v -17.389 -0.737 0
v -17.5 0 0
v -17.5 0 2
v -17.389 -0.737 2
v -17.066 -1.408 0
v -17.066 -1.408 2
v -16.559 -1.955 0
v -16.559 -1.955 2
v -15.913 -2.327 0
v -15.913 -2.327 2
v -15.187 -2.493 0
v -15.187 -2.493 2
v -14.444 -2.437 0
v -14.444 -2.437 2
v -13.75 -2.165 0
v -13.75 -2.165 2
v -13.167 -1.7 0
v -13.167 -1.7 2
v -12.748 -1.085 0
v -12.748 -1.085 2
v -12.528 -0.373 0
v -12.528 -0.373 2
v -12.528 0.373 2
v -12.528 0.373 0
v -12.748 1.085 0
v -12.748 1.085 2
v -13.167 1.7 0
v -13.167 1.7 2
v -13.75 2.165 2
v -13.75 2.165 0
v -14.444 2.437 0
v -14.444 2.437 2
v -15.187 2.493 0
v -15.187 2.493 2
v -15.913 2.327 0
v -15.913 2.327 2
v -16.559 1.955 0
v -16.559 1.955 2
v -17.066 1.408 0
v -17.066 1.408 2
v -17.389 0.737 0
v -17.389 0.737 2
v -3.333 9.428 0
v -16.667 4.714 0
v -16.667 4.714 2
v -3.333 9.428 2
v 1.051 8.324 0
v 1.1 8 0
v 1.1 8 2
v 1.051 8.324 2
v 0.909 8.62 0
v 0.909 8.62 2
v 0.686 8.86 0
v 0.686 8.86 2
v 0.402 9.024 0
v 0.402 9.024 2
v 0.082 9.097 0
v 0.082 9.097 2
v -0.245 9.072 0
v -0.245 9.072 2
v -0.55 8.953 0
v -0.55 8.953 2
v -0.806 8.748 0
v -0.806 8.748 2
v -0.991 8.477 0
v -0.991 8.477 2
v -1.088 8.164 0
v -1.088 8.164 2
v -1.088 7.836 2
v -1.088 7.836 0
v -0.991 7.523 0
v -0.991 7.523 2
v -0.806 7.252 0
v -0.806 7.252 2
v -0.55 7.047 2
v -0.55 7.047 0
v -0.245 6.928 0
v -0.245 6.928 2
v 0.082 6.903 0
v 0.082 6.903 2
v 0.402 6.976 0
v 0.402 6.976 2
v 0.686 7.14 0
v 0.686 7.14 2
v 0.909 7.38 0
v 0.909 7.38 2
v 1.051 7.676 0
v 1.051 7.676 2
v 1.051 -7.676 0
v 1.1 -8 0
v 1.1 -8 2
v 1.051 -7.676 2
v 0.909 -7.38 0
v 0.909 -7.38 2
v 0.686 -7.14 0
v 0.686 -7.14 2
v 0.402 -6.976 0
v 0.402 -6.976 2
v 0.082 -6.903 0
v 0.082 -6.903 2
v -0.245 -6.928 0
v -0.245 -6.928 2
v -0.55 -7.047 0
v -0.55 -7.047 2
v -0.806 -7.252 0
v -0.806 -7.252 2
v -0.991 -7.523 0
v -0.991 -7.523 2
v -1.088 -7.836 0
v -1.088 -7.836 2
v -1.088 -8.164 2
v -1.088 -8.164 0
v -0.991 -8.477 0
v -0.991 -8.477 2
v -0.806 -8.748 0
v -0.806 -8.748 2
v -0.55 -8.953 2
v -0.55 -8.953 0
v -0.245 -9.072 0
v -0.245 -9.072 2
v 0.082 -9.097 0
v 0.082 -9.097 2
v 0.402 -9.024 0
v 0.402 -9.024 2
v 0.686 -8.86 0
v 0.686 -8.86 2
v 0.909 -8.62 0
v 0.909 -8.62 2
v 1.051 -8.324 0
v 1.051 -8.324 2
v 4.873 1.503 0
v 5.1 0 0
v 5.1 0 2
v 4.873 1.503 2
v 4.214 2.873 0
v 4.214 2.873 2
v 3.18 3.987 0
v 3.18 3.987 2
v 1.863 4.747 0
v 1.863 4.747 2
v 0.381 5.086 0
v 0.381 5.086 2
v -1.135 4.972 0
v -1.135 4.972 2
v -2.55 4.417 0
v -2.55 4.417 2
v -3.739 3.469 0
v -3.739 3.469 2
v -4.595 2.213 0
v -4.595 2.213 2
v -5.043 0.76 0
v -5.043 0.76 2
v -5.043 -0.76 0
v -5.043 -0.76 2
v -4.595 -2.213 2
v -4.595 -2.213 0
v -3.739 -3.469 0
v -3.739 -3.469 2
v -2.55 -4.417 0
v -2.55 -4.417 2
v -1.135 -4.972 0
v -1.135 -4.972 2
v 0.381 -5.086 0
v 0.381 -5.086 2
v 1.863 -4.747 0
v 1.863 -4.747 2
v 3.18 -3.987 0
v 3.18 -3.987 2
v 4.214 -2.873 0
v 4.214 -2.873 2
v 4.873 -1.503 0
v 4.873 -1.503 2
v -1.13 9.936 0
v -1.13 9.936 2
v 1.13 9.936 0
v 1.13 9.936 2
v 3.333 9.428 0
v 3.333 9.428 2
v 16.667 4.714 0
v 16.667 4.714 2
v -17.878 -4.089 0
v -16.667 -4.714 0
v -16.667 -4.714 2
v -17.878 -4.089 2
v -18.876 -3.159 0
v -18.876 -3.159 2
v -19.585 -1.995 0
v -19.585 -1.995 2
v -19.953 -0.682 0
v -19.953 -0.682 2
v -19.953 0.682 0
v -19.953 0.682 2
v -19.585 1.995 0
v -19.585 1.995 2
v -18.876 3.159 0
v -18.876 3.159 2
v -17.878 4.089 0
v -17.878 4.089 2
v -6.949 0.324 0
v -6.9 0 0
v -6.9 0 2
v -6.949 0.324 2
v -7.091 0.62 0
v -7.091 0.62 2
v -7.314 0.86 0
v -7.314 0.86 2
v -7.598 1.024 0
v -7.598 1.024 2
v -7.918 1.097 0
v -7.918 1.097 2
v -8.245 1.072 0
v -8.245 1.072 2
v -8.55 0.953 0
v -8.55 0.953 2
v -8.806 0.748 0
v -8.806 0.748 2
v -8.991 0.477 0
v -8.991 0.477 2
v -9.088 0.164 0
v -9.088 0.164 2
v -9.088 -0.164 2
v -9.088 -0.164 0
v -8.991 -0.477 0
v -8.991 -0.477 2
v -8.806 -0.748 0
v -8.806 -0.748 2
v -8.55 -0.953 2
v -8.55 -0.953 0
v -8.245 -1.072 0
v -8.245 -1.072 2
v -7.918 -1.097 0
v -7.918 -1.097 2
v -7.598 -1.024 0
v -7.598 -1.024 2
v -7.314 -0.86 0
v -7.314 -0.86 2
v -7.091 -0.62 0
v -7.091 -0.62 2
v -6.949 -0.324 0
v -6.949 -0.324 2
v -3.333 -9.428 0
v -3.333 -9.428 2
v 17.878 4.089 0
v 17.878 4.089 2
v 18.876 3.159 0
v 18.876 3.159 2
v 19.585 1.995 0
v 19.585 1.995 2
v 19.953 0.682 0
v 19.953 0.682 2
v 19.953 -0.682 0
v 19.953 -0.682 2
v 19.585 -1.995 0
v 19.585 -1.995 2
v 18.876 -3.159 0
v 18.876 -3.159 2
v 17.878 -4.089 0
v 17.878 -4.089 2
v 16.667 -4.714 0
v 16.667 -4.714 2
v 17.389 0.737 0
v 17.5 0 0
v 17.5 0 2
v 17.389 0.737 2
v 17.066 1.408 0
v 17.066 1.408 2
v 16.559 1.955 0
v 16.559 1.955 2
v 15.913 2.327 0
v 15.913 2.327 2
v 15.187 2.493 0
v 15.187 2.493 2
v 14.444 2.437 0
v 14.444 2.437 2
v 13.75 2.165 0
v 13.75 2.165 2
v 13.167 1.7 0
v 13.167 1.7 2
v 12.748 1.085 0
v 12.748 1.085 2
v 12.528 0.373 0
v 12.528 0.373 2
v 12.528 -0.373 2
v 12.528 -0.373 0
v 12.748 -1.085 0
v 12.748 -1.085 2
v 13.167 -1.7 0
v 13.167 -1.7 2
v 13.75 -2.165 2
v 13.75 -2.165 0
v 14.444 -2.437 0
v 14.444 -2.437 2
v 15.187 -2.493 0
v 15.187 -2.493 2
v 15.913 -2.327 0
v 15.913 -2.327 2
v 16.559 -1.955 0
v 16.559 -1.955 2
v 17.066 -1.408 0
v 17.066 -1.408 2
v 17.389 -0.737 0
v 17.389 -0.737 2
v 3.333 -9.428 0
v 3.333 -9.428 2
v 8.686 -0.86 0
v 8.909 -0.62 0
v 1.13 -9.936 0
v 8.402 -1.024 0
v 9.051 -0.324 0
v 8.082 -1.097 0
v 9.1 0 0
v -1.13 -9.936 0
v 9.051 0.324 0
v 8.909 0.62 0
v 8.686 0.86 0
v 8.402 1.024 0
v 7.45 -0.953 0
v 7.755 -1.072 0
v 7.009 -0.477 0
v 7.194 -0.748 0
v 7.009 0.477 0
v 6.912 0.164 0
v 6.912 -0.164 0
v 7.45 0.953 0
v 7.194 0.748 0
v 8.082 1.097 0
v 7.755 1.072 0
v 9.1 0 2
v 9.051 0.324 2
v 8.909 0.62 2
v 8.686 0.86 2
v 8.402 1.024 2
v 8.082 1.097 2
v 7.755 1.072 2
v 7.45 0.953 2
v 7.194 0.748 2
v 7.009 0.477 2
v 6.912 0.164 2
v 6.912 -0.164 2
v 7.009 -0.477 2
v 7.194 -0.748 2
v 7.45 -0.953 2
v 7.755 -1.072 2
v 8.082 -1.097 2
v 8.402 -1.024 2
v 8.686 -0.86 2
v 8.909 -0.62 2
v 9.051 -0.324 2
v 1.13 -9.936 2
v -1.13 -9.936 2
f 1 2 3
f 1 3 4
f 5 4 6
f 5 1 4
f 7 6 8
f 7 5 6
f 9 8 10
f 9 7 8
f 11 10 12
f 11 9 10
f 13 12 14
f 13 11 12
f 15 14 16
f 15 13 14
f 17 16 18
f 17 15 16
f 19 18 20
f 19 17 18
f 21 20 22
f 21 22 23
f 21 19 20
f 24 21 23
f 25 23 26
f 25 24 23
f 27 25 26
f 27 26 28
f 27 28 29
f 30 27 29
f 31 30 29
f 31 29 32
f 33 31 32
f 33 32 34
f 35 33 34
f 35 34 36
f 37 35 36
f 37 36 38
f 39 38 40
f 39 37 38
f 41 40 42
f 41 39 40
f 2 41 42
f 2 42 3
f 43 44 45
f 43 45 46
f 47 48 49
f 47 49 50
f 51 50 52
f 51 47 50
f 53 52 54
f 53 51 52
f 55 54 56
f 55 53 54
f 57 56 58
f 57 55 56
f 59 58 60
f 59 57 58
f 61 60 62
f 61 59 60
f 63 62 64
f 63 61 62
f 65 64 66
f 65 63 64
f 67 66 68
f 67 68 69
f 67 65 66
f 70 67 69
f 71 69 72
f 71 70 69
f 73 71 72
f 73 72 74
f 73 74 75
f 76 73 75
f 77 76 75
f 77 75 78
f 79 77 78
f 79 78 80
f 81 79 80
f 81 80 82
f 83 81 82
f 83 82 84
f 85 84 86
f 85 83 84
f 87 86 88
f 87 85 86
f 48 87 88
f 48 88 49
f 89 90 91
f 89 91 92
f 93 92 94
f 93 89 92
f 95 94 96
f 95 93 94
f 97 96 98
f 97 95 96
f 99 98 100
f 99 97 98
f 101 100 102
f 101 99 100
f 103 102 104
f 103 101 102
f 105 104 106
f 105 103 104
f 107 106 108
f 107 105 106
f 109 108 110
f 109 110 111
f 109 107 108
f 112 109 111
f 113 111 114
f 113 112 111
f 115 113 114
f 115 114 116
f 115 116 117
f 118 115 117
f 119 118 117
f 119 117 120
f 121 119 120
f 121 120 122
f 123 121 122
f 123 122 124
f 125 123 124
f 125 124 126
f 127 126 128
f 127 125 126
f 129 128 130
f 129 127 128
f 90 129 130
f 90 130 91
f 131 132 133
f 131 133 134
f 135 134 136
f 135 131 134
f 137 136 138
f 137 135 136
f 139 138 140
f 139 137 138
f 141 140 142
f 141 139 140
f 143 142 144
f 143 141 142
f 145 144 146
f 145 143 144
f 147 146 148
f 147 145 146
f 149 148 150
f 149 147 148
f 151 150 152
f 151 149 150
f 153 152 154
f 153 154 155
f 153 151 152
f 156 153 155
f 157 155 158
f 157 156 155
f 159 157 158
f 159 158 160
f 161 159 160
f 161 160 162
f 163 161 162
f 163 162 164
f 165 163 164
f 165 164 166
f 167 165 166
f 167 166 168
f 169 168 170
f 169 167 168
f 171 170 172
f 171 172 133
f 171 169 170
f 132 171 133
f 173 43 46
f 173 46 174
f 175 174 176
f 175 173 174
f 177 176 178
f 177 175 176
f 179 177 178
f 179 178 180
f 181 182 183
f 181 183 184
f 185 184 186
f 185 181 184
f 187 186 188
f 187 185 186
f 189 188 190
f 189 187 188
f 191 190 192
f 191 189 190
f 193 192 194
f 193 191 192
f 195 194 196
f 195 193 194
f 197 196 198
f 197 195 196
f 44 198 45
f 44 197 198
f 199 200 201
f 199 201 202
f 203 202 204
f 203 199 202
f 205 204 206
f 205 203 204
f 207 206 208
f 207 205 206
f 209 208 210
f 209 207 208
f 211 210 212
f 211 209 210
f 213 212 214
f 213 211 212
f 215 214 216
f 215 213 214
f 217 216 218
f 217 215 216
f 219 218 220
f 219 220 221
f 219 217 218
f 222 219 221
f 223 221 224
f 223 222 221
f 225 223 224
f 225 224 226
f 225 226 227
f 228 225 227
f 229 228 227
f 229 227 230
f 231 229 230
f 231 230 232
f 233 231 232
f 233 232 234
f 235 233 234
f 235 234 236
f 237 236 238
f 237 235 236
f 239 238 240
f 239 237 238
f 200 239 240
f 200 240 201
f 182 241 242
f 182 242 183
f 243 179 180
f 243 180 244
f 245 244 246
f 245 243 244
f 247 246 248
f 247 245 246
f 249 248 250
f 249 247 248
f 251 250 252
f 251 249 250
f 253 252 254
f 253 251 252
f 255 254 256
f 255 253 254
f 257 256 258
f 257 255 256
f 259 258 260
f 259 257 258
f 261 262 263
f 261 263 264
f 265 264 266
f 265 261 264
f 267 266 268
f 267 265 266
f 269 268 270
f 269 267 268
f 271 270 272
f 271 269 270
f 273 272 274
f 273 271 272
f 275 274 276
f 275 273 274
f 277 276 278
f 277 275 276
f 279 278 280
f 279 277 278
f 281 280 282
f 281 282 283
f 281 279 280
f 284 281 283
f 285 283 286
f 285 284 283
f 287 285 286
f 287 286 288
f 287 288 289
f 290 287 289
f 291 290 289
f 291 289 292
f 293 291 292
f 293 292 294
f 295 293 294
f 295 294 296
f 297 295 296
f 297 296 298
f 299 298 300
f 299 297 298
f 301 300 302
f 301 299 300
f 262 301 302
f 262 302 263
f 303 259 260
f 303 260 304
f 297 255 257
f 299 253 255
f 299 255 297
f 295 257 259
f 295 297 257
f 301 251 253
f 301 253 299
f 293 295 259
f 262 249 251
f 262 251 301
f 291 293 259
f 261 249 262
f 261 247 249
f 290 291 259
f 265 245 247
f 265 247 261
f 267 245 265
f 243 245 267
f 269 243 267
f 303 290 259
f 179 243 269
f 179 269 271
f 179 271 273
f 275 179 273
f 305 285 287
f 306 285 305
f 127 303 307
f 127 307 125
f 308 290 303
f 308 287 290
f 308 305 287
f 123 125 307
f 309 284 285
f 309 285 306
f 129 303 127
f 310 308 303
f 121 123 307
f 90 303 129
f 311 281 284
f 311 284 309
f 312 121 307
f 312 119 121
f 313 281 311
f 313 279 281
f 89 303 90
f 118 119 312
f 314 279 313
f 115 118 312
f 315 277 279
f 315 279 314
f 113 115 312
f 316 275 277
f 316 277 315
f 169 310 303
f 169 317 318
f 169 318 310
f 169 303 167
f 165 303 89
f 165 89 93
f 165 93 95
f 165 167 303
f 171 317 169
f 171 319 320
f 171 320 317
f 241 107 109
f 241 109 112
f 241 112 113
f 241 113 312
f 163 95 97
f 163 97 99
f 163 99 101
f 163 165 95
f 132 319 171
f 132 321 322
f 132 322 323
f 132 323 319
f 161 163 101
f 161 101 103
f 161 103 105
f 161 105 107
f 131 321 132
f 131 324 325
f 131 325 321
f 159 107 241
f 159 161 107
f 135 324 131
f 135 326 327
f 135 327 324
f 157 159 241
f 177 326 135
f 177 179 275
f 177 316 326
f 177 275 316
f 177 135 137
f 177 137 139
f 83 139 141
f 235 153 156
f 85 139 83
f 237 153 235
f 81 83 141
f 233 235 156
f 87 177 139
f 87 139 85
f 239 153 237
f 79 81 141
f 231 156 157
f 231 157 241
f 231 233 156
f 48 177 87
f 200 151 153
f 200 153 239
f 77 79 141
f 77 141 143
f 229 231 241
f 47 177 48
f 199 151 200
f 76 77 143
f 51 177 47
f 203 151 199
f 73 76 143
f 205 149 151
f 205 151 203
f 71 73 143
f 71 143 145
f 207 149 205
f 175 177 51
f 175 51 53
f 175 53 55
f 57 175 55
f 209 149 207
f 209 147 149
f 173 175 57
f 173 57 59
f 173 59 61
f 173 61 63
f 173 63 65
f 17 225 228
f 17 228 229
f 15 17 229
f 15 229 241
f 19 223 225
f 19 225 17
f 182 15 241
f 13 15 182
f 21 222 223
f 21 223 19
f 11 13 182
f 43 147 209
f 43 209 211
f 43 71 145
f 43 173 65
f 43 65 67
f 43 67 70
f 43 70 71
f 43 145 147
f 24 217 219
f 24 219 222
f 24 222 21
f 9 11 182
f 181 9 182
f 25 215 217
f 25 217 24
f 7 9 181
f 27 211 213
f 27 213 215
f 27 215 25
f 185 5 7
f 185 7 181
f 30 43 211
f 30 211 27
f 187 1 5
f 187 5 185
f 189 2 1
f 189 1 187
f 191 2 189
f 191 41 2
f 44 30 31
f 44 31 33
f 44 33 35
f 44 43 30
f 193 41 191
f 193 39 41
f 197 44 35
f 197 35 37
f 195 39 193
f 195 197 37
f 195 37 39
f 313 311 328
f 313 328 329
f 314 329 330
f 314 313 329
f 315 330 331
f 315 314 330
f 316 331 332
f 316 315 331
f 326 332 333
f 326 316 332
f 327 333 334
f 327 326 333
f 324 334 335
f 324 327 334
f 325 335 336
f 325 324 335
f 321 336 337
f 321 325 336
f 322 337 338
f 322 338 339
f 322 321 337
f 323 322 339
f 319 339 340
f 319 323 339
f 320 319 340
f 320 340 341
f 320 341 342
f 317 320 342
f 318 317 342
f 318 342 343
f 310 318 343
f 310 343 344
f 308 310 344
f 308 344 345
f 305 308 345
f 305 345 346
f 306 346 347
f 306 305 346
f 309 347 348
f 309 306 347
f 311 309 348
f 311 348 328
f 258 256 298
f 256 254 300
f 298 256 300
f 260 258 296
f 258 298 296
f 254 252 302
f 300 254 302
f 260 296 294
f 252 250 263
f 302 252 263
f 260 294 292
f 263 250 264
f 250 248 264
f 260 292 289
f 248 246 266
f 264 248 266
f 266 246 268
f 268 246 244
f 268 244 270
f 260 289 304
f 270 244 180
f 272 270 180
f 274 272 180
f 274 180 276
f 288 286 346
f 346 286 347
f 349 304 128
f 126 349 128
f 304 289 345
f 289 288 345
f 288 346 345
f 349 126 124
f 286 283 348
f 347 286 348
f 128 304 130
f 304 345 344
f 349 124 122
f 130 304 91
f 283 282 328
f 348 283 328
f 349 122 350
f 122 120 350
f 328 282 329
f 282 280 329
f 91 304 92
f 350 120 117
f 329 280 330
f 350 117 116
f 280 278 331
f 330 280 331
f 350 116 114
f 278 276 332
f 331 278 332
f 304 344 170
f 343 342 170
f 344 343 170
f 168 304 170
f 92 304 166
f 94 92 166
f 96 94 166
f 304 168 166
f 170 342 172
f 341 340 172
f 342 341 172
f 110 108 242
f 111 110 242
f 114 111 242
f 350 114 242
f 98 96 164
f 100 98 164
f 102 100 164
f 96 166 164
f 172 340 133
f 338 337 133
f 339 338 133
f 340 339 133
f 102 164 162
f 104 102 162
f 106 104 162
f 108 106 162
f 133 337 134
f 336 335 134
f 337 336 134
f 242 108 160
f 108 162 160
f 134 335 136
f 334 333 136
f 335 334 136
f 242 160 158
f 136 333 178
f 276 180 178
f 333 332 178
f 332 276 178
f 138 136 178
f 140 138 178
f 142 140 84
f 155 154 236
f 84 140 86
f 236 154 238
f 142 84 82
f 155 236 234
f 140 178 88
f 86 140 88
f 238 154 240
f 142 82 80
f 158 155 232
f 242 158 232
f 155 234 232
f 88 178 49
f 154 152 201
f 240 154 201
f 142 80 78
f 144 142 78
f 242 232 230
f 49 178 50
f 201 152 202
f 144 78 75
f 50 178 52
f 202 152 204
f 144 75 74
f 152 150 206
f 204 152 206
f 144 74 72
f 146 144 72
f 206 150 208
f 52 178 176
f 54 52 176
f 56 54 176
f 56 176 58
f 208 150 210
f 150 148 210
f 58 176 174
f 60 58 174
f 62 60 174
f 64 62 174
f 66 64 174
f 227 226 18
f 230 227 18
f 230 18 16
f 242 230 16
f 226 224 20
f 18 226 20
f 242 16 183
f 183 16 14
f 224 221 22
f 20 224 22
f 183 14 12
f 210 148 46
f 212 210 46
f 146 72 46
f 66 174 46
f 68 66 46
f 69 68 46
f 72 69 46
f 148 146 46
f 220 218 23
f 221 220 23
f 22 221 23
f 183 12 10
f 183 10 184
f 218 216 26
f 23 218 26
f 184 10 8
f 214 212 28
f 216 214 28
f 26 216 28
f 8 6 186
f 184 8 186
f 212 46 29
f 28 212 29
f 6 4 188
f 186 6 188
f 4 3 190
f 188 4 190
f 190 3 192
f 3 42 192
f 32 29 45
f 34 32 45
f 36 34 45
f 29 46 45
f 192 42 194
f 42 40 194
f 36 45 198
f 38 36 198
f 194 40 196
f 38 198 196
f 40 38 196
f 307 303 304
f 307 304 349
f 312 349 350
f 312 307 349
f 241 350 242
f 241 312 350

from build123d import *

# Parameters (mm, degrees)
SKETCH_1_R      = 1.1
SKETCH_1_R_2    = 5.1
SKETCH_1_R_3    = 2.5
EXTRUDE_1_DEPTH = 2


with BuildPart() as part:
    # 草图1 → 凸台-拉伸1 (new body)
    with BuildSketch(Plane.XY):
        with BuildLine():
            Line((3.333333333, 9.428090416), (16.666666667, 4.714045208))
            ThreePointArc((16.666666667, 4.714045208), (20, 0), (16.666666667, -4.714045208))
            Line((16.666666667, -4.714045208), (3.333333333, -9.428090416))
            ThreePointArc((3.333333333, -9.428090416), (0, -10), (-3.333333333, -9.428090416))
            Line((-3.333333333, -9.428090416), (-16.666666667, -4.714045208))
            ThreePointArc((-16.666666667, -4.714045208), (-20, 0), (-16.666666667, 4.714045208))
            Line((-16.666666667, 4.714045208), (-3.333333333, 9.428090416))
            ThreePointArc((-3.333333333, 9.428090416), (0, 10), (3.333333333, 9.428090416))
        make_face()
        with Locations((0, 8)):
            Circle(SKETCH_1_R, mode=Mode.SUBTRACT)
        with Locations((8, 0)):
            Circle(SKETCH_1_R, mode=Mode.SUBTRACT)
        with Locations((0, -8)):
            Circle(SKETCH_1_R, mode=Mode.SUBTRACT)
        with Locations((-8, 0)):
            Circle(SKETCH_1_R, mode=Mode.SUBTRACT)
        Circle(SKETCH_1_R_2, mode=Mode.SUBTRACT)
        with Locations((15, 0)):
            Circle(SKETCH_1_R_3, mode=Mode.SUBTRACT)
        with Locations(Location((-15, 0, 0), (0, 0, 180))):
            Circle(SKETCH_1_R_3, mode=Mode.SUBTRACT)
    extrude(amount=EXTRUDE_1_DEPTH)


solid = part.part
